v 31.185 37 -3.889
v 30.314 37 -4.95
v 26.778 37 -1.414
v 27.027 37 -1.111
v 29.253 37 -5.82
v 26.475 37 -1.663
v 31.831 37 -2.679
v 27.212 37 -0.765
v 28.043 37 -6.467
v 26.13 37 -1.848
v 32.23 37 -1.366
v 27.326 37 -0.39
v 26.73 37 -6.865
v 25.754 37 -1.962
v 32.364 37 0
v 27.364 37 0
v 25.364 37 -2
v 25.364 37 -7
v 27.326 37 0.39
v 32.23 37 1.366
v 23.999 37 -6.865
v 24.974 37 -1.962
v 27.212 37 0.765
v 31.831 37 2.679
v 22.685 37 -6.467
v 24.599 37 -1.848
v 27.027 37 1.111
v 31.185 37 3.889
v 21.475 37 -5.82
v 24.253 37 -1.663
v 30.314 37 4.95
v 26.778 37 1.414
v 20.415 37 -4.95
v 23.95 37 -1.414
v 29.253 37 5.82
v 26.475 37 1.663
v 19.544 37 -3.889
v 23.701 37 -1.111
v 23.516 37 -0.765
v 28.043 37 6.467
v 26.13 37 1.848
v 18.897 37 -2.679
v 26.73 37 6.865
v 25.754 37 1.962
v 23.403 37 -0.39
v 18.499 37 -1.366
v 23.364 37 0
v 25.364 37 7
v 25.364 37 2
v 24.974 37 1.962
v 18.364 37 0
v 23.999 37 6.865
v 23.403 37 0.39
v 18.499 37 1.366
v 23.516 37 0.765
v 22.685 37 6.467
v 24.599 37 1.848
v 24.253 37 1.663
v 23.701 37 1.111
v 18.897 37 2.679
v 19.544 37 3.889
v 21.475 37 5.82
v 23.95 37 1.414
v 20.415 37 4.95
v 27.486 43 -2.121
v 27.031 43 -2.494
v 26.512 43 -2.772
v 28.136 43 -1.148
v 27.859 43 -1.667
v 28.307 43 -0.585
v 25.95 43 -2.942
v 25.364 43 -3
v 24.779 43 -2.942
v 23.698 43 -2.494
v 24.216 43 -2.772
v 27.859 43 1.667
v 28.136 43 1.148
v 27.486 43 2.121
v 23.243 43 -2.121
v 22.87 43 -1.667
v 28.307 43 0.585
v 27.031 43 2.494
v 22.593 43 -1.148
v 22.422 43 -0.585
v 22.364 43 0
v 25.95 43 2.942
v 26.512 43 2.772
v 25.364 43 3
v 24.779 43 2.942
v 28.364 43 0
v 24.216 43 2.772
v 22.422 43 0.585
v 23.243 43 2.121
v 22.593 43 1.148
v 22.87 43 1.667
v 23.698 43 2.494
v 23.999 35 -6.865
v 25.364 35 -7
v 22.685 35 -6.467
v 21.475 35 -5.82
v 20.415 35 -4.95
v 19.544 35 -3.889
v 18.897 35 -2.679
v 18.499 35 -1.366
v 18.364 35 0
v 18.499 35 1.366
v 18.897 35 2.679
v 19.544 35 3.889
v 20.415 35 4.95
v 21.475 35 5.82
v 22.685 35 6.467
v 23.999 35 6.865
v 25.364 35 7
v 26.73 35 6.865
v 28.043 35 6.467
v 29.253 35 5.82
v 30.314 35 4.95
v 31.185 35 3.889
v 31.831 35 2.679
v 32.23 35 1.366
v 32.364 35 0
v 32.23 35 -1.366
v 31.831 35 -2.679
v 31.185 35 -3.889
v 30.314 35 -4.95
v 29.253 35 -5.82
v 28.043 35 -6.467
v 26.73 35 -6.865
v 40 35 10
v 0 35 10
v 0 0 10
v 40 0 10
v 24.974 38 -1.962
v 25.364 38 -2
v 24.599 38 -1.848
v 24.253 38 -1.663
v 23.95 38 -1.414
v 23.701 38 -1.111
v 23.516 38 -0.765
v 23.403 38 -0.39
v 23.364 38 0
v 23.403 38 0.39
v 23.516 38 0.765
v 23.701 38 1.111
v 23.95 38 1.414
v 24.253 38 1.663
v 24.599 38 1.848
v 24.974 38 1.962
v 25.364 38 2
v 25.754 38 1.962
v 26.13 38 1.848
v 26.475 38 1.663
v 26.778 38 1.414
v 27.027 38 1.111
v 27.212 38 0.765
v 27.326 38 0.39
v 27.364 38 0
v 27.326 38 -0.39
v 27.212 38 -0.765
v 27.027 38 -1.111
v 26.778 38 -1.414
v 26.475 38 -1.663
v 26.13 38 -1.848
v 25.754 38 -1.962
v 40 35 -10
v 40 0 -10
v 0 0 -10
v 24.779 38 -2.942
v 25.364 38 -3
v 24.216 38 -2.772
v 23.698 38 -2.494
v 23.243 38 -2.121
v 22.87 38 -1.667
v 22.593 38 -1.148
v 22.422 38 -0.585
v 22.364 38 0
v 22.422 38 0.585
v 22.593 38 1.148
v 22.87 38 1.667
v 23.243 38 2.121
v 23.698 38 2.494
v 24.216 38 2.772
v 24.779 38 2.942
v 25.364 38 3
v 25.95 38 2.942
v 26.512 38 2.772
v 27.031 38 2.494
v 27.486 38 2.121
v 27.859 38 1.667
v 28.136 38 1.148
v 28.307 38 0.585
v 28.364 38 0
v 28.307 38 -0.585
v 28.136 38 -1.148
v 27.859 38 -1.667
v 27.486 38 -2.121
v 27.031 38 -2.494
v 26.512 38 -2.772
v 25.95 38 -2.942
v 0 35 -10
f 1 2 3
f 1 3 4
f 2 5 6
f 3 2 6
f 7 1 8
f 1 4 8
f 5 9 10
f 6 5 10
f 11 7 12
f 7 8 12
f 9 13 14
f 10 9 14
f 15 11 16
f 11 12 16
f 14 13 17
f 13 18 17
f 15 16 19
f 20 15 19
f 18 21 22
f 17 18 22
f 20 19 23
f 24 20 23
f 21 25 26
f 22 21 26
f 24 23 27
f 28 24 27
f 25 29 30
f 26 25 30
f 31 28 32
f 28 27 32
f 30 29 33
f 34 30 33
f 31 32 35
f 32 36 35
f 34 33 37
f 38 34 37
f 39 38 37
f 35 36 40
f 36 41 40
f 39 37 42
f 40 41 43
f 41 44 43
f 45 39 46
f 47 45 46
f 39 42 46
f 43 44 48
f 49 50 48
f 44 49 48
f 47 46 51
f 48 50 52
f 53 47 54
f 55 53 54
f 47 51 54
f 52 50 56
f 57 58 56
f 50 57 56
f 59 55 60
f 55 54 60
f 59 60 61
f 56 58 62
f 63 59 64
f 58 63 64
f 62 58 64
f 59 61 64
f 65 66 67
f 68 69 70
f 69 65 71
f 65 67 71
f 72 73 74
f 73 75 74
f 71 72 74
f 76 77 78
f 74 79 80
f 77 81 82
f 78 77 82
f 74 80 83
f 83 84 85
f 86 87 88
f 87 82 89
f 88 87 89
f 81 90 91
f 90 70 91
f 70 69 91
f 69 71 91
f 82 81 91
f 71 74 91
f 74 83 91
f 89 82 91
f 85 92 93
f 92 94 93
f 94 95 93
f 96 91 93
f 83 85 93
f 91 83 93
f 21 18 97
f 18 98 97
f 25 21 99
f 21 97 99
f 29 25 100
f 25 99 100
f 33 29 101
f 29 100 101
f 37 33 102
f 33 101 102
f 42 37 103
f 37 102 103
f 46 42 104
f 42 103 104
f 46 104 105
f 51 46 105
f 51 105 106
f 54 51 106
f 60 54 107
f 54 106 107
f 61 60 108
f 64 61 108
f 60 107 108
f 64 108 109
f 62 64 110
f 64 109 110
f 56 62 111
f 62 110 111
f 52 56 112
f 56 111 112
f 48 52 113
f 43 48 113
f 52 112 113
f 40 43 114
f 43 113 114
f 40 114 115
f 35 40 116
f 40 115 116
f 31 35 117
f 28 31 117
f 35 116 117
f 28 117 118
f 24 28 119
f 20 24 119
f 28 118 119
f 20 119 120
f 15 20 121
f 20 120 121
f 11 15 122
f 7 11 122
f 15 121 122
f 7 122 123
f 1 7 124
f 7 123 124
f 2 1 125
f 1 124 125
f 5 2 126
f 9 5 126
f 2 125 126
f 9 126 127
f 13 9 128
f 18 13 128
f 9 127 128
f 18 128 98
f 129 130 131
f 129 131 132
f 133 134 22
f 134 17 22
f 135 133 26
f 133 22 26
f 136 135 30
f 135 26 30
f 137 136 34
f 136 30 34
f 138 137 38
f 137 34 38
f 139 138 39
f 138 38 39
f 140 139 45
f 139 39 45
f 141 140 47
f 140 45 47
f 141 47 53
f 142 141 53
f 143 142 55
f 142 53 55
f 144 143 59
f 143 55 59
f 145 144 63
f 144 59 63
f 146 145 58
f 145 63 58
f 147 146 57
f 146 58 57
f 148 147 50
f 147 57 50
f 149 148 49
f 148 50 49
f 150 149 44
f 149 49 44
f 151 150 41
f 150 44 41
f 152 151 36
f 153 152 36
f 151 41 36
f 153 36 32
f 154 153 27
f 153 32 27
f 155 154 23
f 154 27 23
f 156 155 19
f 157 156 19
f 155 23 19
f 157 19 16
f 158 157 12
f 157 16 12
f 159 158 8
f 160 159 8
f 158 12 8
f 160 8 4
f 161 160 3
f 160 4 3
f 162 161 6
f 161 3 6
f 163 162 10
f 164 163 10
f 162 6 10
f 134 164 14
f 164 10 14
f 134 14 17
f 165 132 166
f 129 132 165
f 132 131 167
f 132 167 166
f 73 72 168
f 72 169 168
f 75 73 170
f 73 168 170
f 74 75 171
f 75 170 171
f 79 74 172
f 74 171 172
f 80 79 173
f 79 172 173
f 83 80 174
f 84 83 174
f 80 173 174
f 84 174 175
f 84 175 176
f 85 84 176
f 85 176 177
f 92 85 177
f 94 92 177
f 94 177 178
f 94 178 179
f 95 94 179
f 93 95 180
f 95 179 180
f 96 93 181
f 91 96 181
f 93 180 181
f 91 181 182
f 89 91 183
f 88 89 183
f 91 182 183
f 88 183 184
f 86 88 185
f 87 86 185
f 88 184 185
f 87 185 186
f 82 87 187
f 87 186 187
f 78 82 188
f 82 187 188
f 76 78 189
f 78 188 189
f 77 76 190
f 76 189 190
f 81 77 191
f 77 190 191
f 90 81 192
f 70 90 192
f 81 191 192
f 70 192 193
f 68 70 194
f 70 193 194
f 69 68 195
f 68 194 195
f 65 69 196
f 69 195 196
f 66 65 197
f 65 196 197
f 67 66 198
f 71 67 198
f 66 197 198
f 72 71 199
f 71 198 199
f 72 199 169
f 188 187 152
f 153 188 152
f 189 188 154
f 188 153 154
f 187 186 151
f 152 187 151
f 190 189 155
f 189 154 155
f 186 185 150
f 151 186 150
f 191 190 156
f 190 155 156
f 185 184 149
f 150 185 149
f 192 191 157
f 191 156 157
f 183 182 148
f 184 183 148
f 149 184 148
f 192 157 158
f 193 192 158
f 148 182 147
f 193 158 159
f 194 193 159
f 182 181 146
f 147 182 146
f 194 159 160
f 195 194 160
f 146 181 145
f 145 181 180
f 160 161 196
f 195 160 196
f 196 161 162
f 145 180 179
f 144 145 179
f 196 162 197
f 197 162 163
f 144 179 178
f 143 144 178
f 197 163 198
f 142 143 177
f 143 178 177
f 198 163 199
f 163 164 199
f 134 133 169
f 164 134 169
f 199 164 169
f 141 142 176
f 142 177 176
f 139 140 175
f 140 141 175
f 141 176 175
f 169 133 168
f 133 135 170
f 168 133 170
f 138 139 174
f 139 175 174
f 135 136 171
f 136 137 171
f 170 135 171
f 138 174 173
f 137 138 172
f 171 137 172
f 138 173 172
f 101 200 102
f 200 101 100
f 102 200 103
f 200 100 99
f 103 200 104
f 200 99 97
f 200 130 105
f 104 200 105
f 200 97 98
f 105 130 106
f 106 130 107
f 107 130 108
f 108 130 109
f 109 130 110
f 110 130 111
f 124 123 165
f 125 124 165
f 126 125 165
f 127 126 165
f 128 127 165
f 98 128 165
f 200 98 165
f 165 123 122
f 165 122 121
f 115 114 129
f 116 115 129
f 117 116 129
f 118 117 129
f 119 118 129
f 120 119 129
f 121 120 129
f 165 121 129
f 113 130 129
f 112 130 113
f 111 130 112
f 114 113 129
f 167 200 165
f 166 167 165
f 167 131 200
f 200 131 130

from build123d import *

# Parameters (mm, degrees)
SKETCH_1_W      = 40
SKETCH_1_H      = 35
EXTRUDE_1_DEPTH = 10


with BuildPart() as part:
    # ｽｹｯﾁ1 → ﾎﾞｽ - 押し出し1 (new, symmetric)
    with BuildSketch(Plane.XY):
        with Locations((20, 17.5)):
            Rectangle(SKETCH_1_W, SKETCH_1_H)
    extrude(amount=EXTRUDE_1_DEPTH, both=True)

    # ｽｹｯﾁ2 → 回転1 (revolve)
    with BuildSketch(Plane.XY, mode=Mode.PRIVATE) as revolve_1_sk:
        Polygon((25.364248034, 35), (25.364248034, 43), (22.364248034, 43), (22.364248034, 38), (23.364248034, 38), (23.364248034, 37), (18.364248034, 37), (18.364248034, 35), align=None)
    revolve(revolve_1_sk.sketch.rotate(Axis((25.364248034, 35, 0), (0, 1, 0)), 270), axis=Axis((25.364248034, 35, 0), (0, 1, 0)))


solid = part.part
